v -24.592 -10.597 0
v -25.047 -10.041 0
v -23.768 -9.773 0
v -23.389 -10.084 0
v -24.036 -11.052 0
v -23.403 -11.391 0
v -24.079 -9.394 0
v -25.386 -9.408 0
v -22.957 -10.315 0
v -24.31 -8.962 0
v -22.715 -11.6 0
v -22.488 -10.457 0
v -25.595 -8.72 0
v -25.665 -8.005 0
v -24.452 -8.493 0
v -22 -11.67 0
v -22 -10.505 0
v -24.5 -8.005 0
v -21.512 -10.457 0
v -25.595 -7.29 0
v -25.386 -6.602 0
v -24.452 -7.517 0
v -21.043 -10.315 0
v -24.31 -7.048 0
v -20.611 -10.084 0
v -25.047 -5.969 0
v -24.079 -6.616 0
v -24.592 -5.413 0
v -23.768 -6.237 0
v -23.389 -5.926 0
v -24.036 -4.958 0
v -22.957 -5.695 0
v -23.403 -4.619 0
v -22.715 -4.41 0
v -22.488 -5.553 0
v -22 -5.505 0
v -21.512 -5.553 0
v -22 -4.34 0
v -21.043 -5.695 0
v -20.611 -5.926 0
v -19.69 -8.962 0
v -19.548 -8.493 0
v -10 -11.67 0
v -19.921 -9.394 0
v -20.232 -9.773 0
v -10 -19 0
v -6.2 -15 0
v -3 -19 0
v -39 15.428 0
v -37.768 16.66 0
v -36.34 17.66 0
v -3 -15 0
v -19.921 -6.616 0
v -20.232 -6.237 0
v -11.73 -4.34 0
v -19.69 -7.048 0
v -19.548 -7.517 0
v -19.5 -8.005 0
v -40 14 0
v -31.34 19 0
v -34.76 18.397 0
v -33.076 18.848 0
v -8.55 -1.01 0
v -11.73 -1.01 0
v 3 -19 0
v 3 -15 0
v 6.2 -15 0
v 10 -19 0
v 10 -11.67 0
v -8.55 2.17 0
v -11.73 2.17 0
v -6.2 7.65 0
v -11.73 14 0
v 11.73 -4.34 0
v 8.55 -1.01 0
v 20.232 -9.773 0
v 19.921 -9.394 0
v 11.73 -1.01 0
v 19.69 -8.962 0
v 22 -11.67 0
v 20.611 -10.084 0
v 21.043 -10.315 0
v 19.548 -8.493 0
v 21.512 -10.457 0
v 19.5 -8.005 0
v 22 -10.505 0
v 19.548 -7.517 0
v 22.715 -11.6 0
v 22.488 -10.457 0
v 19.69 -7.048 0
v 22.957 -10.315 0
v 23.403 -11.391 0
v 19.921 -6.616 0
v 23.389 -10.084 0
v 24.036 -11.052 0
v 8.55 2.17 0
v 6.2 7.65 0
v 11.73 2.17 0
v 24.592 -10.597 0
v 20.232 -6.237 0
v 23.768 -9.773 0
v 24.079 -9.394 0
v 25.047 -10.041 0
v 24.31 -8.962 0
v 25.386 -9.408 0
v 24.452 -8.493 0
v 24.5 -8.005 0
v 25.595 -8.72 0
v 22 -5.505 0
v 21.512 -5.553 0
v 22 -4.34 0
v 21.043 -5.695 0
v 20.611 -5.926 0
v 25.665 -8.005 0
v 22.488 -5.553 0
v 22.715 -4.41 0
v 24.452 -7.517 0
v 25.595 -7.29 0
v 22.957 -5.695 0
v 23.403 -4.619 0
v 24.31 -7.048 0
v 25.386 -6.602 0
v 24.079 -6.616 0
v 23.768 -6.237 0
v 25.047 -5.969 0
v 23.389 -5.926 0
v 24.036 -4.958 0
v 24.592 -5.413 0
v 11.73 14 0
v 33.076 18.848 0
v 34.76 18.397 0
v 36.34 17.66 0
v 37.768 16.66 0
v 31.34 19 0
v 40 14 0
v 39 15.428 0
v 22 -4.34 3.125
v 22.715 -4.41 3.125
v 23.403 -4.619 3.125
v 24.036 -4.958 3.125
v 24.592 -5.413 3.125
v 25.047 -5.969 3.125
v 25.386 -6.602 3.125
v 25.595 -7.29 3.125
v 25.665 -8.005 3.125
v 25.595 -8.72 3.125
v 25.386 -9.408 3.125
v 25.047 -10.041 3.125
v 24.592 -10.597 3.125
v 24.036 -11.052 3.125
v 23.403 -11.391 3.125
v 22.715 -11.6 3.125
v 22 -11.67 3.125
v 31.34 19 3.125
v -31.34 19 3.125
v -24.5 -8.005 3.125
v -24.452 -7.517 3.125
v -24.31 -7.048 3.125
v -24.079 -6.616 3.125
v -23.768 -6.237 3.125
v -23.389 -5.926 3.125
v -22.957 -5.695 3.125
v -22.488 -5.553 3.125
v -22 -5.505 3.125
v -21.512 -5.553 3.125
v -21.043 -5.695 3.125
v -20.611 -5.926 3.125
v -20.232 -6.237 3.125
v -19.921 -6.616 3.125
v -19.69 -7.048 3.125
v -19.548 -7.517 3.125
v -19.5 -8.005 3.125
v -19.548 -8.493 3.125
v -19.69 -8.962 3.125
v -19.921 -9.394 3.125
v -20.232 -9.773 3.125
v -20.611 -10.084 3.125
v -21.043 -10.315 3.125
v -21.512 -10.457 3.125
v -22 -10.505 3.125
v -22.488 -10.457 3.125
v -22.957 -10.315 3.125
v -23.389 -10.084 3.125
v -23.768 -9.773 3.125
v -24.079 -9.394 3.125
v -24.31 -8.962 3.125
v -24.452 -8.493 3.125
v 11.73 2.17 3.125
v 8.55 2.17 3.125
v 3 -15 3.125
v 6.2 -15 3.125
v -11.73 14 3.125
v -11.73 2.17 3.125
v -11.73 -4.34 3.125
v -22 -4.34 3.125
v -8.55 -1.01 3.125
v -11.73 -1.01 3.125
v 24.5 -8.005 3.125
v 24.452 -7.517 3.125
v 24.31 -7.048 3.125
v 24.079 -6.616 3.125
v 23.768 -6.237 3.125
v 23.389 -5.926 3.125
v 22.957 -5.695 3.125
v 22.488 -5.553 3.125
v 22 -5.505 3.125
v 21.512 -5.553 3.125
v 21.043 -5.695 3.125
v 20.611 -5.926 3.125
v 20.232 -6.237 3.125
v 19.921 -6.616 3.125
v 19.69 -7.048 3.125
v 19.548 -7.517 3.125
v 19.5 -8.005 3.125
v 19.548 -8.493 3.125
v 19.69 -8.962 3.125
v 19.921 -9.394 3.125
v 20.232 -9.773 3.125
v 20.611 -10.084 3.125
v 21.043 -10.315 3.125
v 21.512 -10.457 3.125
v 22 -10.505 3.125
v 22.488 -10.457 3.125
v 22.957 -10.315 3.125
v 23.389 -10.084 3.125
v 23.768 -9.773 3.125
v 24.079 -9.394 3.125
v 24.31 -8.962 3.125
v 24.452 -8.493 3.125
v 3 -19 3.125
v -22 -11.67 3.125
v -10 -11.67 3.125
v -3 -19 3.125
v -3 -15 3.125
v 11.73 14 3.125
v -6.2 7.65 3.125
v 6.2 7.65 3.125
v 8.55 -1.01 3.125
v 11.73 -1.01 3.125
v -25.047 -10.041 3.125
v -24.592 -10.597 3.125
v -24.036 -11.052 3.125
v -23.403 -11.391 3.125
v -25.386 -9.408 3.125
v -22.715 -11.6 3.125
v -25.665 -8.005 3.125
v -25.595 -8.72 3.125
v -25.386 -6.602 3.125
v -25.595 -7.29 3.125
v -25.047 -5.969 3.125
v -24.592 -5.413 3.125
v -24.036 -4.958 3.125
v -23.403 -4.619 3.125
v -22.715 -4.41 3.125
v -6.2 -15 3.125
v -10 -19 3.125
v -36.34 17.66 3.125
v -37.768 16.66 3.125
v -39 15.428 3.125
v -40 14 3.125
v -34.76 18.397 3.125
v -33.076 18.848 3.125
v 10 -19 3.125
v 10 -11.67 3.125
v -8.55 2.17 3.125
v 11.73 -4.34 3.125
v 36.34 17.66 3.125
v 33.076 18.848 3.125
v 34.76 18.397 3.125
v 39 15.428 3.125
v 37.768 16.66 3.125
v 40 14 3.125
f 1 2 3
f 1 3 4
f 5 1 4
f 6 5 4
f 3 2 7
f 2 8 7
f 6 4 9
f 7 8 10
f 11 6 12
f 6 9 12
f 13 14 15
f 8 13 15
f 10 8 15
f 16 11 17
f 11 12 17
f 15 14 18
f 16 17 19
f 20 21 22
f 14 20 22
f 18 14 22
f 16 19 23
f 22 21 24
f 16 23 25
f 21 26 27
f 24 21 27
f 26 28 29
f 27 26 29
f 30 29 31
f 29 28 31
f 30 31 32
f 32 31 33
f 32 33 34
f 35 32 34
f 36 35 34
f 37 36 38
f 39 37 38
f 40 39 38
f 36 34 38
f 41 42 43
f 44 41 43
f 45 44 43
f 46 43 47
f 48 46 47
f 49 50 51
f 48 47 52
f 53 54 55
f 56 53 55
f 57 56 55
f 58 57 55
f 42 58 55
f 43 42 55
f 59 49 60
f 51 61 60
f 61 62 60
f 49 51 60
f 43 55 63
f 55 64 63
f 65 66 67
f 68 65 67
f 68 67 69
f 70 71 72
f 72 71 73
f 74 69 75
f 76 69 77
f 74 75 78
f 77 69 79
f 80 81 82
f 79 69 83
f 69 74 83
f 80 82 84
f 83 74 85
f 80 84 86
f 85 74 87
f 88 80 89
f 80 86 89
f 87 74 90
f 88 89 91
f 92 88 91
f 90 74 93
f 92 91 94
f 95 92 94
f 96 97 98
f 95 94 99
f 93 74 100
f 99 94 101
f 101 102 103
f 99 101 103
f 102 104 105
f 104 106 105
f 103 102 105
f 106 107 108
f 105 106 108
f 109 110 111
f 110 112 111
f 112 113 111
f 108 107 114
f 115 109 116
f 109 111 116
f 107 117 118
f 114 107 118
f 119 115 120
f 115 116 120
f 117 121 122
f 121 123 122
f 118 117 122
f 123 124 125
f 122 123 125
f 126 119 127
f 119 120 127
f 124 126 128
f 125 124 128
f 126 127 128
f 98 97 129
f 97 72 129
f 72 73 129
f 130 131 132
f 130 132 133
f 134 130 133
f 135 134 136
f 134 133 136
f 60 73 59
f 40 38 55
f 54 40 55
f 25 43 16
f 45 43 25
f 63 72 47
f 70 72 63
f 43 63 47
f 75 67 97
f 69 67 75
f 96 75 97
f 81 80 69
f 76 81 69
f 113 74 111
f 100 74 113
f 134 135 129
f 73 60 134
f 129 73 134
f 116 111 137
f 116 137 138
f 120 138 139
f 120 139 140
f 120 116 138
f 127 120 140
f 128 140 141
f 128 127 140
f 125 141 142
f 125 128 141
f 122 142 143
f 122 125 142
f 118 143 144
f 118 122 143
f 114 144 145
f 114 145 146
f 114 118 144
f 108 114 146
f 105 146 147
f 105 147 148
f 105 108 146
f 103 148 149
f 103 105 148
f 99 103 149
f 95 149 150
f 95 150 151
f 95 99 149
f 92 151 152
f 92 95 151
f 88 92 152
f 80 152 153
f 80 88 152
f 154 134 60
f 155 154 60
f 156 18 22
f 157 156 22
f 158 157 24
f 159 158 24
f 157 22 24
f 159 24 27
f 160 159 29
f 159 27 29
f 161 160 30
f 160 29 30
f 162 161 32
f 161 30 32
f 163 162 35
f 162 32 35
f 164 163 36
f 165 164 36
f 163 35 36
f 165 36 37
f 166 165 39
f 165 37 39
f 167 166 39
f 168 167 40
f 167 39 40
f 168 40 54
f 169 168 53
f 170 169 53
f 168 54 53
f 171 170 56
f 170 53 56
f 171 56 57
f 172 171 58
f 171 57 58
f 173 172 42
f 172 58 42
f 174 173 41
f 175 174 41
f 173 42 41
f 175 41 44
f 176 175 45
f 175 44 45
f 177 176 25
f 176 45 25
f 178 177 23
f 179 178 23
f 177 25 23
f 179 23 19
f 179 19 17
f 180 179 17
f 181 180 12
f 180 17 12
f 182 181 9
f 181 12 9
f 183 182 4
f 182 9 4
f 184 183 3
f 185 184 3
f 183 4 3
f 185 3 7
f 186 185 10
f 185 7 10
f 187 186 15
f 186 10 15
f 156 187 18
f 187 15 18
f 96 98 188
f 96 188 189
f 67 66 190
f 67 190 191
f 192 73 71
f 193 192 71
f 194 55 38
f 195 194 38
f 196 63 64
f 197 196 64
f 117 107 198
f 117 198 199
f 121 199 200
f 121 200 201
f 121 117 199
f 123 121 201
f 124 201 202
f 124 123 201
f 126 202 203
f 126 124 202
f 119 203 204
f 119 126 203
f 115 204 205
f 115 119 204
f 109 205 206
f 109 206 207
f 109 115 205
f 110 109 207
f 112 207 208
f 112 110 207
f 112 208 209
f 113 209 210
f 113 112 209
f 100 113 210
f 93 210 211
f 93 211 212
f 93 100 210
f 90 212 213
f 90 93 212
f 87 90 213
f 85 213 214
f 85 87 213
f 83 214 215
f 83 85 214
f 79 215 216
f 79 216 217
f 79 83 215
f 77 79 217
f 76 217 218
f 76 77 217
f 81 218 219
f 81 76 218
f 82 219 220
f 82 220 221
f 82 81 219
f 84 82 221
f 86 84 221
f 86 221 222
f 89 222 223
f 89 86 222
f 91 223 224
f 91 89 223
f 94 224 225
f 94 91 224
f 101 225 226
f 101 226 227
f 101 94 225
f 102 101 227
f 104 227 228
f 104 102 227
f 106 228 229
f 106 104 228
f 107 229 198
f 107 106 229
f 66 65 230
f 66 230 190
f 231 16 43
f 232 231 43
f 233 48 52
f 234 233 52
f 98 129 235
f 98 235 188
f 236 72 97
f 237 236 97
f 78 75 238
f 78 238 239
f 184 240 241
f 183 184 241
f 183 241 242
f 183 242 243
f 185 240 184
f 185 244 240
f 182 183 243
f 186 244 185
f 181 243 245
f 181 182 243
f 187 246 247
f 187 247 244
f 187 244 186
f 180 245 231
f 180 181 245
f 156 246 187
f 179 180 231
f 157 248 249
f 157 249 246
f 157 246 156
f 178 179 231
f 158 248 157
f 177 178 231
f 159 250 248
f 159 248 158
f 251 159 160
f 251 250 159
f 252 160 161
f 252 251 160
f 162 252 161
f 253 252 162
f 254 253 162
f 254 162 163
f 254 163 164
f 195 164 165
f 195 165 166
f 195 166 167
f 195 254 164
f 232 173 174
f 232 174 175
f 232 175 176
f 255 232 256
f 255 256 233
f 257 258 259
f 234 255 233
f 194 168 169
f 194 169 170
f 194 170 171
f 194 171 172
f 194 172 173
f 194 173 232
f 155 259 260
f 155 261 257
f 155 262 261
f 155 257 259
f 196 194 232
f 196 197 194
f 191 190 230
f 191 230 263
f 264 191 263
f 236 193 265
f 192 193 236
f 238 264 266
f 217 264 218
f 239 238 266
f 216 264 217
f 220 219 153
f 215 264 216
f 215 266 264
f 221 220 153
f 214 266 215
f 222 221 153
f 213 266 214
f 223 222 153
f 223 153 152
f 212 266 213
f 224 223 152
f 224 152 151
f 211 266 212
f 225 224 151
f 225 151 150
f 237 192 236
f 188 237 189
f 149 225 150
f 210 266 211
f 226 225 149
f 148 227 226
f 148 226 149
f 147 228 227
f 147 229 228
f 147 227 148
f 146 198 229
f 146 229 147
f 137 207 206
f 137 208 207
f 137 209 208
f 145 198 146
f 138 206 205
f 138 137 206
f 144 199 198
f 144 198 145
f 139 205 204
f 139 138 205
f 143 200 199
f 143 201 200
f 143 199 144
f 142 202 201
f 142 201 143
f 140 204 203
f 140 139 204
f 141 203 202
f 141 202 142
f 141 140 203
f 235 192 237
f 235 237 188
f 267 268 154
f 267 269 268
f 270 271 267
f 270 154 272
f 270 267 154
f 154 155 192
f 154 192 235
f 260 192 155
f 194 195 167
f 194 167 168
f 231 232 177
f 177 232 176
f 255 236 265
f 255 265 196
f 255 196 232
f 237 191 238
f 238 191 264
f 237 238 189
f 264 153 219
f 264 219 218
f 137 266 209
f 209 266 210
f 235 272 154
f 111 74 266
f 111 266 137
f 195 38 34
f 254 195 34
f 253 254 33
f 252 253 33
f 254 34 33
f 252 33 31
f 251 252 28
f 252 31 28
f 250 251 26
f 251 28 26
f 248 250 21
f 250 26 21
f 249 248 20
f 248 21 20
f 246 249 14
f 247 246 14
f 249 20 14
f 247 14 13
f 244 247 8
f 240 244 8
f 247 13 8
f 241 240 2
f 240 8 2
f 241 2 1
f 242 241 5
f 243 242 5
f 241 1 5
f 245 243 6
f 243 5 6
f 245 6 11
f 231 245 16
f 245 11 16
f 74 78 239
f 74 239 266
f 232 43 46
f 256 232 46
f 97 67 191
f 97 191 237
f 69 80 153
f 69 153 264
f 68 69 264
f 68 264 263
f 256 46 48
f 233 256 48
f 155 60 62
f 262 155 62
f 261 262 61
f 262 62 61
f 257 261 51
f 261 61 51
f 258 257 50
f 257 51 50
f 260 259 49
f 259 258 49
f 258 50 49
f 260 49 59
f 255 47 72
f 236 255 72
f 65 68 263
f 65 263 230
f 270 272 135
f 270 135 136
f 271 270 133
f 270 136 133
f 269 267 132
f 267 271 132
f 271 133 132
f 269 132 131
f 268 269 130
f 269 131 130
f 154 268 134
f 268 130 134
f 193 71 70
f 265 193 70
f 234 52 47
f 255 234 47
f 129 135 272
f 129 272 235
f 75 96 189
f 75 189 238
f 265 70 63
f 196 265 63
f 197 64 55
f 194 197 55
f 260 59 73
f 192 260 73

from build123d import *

# Parameters (mm, degrees)
SKETCH1_R           = 2.5
BOSS_EXTRUDE1_DEPTH = 3.125
FILLET1_R           = 10


with BuildPart() as part:
    # Sketch1 → Boss-Extrude1 (new body)
    with BuildSketch(Plane.XY):
        with BuildLine():
            Line((0, 19), (40, 19))
            Line((40, 19), (40, 14))
            Line((40, 14), (11.73, 14))
            Line((11.73, 14), (11.73, 2.17))
            Line((11.73, 2.17), (8.55, 2.17))
            Line((8.55, 2.17), (8.55, -1.01))
            Line((8.55, -1.01), (11.73, -1.01))
            Line((11.73, -1.01), (11.73, -4.34))
            Line((11.73, -4.34), (22, -4.34))
            ThreePointArc((22, -4.34), (25.665, -8.005), (22, -11.67))
            Line((22, -11.67), (10, -11.67))
            Line((10, -11.67), (10, -19))
            Line((10, -19), (3, -19))
            Line((3, -19), (3, -15))
            Line((3, -15), (6.2, -15))
            Line((6.2, -15), (6.2, 7.65))
            Line((6.2, 7.65), (0, 7.65))
            Line((0, 7.65), (0, 19))
        make_face()
        with Locations((22, -8.005)):
            Circle(SKETCH1_R, mode=Mode.SUBTRACT)
    boss_extrude1 = extrude(amount=BOSS_EXTRUDE1_DEPTH)

    # Mirror1: Boss-Extrude1 across plane
    add(boss_extrude1.mirror(Plane(origin=(0, 19, 3.125), x_dir=(0, 0, 1), z_dir=(1, 0, 0))))

    # Fillet1
    # the kernel refuses this fillet: 10 mm, written as the material it takes off along each edge
    with BuildSketch(Plane(origin=(-40, 19, -21.650635095), x_dir=(1, 0, 0), z_dir=(0, 0, 1))) as fillet1_piece_1:
        with BuildLine():
            CenterArc((8.660254038, -10), FILLET1_R, 90, 60)
            Line((0, -5), (-0.173205081, -4.9))
            ThreePointArc((-0.173205081, -4.9), (-0.2, -2.5), (-0.2, 0))
            Line((-0.2, 0), (0, 0.2))
            Line((0, 0.2), (8.660254038, 0.2))
            Line((8.660254038, 0.2), (8.660254038, 0))
        make_face()
    extrude(amount=46.426270189, mode=Mode.SUBTRACT)
    with BuildSketch(Plane(origin=(40, 19, -21.650635095), x_dir=(-1, 0, 0), z_dir=(0, 0, 1))) as fillet1_piece_2:
        with BuildLine():
            CenterArc((8.660254038, 10), FILLET1_R, 210, 60)
            Line((0, 5), (-0.173205081, 4.9))
            ThreePointArc((-0.173205081, 4.9), (-0.2, 2.5), (-0.2, 0))
            Line((-0.2, 0), (0, -0.2))
            Line((0, -0.2), (8.660254038, -0.2))
            Line((8.660254038, -0.2), (8.660254038, 0))
        make_face()
    extrude(amount=46.426270189, mode=Mode.SUBTRACT)


solid = part.part
